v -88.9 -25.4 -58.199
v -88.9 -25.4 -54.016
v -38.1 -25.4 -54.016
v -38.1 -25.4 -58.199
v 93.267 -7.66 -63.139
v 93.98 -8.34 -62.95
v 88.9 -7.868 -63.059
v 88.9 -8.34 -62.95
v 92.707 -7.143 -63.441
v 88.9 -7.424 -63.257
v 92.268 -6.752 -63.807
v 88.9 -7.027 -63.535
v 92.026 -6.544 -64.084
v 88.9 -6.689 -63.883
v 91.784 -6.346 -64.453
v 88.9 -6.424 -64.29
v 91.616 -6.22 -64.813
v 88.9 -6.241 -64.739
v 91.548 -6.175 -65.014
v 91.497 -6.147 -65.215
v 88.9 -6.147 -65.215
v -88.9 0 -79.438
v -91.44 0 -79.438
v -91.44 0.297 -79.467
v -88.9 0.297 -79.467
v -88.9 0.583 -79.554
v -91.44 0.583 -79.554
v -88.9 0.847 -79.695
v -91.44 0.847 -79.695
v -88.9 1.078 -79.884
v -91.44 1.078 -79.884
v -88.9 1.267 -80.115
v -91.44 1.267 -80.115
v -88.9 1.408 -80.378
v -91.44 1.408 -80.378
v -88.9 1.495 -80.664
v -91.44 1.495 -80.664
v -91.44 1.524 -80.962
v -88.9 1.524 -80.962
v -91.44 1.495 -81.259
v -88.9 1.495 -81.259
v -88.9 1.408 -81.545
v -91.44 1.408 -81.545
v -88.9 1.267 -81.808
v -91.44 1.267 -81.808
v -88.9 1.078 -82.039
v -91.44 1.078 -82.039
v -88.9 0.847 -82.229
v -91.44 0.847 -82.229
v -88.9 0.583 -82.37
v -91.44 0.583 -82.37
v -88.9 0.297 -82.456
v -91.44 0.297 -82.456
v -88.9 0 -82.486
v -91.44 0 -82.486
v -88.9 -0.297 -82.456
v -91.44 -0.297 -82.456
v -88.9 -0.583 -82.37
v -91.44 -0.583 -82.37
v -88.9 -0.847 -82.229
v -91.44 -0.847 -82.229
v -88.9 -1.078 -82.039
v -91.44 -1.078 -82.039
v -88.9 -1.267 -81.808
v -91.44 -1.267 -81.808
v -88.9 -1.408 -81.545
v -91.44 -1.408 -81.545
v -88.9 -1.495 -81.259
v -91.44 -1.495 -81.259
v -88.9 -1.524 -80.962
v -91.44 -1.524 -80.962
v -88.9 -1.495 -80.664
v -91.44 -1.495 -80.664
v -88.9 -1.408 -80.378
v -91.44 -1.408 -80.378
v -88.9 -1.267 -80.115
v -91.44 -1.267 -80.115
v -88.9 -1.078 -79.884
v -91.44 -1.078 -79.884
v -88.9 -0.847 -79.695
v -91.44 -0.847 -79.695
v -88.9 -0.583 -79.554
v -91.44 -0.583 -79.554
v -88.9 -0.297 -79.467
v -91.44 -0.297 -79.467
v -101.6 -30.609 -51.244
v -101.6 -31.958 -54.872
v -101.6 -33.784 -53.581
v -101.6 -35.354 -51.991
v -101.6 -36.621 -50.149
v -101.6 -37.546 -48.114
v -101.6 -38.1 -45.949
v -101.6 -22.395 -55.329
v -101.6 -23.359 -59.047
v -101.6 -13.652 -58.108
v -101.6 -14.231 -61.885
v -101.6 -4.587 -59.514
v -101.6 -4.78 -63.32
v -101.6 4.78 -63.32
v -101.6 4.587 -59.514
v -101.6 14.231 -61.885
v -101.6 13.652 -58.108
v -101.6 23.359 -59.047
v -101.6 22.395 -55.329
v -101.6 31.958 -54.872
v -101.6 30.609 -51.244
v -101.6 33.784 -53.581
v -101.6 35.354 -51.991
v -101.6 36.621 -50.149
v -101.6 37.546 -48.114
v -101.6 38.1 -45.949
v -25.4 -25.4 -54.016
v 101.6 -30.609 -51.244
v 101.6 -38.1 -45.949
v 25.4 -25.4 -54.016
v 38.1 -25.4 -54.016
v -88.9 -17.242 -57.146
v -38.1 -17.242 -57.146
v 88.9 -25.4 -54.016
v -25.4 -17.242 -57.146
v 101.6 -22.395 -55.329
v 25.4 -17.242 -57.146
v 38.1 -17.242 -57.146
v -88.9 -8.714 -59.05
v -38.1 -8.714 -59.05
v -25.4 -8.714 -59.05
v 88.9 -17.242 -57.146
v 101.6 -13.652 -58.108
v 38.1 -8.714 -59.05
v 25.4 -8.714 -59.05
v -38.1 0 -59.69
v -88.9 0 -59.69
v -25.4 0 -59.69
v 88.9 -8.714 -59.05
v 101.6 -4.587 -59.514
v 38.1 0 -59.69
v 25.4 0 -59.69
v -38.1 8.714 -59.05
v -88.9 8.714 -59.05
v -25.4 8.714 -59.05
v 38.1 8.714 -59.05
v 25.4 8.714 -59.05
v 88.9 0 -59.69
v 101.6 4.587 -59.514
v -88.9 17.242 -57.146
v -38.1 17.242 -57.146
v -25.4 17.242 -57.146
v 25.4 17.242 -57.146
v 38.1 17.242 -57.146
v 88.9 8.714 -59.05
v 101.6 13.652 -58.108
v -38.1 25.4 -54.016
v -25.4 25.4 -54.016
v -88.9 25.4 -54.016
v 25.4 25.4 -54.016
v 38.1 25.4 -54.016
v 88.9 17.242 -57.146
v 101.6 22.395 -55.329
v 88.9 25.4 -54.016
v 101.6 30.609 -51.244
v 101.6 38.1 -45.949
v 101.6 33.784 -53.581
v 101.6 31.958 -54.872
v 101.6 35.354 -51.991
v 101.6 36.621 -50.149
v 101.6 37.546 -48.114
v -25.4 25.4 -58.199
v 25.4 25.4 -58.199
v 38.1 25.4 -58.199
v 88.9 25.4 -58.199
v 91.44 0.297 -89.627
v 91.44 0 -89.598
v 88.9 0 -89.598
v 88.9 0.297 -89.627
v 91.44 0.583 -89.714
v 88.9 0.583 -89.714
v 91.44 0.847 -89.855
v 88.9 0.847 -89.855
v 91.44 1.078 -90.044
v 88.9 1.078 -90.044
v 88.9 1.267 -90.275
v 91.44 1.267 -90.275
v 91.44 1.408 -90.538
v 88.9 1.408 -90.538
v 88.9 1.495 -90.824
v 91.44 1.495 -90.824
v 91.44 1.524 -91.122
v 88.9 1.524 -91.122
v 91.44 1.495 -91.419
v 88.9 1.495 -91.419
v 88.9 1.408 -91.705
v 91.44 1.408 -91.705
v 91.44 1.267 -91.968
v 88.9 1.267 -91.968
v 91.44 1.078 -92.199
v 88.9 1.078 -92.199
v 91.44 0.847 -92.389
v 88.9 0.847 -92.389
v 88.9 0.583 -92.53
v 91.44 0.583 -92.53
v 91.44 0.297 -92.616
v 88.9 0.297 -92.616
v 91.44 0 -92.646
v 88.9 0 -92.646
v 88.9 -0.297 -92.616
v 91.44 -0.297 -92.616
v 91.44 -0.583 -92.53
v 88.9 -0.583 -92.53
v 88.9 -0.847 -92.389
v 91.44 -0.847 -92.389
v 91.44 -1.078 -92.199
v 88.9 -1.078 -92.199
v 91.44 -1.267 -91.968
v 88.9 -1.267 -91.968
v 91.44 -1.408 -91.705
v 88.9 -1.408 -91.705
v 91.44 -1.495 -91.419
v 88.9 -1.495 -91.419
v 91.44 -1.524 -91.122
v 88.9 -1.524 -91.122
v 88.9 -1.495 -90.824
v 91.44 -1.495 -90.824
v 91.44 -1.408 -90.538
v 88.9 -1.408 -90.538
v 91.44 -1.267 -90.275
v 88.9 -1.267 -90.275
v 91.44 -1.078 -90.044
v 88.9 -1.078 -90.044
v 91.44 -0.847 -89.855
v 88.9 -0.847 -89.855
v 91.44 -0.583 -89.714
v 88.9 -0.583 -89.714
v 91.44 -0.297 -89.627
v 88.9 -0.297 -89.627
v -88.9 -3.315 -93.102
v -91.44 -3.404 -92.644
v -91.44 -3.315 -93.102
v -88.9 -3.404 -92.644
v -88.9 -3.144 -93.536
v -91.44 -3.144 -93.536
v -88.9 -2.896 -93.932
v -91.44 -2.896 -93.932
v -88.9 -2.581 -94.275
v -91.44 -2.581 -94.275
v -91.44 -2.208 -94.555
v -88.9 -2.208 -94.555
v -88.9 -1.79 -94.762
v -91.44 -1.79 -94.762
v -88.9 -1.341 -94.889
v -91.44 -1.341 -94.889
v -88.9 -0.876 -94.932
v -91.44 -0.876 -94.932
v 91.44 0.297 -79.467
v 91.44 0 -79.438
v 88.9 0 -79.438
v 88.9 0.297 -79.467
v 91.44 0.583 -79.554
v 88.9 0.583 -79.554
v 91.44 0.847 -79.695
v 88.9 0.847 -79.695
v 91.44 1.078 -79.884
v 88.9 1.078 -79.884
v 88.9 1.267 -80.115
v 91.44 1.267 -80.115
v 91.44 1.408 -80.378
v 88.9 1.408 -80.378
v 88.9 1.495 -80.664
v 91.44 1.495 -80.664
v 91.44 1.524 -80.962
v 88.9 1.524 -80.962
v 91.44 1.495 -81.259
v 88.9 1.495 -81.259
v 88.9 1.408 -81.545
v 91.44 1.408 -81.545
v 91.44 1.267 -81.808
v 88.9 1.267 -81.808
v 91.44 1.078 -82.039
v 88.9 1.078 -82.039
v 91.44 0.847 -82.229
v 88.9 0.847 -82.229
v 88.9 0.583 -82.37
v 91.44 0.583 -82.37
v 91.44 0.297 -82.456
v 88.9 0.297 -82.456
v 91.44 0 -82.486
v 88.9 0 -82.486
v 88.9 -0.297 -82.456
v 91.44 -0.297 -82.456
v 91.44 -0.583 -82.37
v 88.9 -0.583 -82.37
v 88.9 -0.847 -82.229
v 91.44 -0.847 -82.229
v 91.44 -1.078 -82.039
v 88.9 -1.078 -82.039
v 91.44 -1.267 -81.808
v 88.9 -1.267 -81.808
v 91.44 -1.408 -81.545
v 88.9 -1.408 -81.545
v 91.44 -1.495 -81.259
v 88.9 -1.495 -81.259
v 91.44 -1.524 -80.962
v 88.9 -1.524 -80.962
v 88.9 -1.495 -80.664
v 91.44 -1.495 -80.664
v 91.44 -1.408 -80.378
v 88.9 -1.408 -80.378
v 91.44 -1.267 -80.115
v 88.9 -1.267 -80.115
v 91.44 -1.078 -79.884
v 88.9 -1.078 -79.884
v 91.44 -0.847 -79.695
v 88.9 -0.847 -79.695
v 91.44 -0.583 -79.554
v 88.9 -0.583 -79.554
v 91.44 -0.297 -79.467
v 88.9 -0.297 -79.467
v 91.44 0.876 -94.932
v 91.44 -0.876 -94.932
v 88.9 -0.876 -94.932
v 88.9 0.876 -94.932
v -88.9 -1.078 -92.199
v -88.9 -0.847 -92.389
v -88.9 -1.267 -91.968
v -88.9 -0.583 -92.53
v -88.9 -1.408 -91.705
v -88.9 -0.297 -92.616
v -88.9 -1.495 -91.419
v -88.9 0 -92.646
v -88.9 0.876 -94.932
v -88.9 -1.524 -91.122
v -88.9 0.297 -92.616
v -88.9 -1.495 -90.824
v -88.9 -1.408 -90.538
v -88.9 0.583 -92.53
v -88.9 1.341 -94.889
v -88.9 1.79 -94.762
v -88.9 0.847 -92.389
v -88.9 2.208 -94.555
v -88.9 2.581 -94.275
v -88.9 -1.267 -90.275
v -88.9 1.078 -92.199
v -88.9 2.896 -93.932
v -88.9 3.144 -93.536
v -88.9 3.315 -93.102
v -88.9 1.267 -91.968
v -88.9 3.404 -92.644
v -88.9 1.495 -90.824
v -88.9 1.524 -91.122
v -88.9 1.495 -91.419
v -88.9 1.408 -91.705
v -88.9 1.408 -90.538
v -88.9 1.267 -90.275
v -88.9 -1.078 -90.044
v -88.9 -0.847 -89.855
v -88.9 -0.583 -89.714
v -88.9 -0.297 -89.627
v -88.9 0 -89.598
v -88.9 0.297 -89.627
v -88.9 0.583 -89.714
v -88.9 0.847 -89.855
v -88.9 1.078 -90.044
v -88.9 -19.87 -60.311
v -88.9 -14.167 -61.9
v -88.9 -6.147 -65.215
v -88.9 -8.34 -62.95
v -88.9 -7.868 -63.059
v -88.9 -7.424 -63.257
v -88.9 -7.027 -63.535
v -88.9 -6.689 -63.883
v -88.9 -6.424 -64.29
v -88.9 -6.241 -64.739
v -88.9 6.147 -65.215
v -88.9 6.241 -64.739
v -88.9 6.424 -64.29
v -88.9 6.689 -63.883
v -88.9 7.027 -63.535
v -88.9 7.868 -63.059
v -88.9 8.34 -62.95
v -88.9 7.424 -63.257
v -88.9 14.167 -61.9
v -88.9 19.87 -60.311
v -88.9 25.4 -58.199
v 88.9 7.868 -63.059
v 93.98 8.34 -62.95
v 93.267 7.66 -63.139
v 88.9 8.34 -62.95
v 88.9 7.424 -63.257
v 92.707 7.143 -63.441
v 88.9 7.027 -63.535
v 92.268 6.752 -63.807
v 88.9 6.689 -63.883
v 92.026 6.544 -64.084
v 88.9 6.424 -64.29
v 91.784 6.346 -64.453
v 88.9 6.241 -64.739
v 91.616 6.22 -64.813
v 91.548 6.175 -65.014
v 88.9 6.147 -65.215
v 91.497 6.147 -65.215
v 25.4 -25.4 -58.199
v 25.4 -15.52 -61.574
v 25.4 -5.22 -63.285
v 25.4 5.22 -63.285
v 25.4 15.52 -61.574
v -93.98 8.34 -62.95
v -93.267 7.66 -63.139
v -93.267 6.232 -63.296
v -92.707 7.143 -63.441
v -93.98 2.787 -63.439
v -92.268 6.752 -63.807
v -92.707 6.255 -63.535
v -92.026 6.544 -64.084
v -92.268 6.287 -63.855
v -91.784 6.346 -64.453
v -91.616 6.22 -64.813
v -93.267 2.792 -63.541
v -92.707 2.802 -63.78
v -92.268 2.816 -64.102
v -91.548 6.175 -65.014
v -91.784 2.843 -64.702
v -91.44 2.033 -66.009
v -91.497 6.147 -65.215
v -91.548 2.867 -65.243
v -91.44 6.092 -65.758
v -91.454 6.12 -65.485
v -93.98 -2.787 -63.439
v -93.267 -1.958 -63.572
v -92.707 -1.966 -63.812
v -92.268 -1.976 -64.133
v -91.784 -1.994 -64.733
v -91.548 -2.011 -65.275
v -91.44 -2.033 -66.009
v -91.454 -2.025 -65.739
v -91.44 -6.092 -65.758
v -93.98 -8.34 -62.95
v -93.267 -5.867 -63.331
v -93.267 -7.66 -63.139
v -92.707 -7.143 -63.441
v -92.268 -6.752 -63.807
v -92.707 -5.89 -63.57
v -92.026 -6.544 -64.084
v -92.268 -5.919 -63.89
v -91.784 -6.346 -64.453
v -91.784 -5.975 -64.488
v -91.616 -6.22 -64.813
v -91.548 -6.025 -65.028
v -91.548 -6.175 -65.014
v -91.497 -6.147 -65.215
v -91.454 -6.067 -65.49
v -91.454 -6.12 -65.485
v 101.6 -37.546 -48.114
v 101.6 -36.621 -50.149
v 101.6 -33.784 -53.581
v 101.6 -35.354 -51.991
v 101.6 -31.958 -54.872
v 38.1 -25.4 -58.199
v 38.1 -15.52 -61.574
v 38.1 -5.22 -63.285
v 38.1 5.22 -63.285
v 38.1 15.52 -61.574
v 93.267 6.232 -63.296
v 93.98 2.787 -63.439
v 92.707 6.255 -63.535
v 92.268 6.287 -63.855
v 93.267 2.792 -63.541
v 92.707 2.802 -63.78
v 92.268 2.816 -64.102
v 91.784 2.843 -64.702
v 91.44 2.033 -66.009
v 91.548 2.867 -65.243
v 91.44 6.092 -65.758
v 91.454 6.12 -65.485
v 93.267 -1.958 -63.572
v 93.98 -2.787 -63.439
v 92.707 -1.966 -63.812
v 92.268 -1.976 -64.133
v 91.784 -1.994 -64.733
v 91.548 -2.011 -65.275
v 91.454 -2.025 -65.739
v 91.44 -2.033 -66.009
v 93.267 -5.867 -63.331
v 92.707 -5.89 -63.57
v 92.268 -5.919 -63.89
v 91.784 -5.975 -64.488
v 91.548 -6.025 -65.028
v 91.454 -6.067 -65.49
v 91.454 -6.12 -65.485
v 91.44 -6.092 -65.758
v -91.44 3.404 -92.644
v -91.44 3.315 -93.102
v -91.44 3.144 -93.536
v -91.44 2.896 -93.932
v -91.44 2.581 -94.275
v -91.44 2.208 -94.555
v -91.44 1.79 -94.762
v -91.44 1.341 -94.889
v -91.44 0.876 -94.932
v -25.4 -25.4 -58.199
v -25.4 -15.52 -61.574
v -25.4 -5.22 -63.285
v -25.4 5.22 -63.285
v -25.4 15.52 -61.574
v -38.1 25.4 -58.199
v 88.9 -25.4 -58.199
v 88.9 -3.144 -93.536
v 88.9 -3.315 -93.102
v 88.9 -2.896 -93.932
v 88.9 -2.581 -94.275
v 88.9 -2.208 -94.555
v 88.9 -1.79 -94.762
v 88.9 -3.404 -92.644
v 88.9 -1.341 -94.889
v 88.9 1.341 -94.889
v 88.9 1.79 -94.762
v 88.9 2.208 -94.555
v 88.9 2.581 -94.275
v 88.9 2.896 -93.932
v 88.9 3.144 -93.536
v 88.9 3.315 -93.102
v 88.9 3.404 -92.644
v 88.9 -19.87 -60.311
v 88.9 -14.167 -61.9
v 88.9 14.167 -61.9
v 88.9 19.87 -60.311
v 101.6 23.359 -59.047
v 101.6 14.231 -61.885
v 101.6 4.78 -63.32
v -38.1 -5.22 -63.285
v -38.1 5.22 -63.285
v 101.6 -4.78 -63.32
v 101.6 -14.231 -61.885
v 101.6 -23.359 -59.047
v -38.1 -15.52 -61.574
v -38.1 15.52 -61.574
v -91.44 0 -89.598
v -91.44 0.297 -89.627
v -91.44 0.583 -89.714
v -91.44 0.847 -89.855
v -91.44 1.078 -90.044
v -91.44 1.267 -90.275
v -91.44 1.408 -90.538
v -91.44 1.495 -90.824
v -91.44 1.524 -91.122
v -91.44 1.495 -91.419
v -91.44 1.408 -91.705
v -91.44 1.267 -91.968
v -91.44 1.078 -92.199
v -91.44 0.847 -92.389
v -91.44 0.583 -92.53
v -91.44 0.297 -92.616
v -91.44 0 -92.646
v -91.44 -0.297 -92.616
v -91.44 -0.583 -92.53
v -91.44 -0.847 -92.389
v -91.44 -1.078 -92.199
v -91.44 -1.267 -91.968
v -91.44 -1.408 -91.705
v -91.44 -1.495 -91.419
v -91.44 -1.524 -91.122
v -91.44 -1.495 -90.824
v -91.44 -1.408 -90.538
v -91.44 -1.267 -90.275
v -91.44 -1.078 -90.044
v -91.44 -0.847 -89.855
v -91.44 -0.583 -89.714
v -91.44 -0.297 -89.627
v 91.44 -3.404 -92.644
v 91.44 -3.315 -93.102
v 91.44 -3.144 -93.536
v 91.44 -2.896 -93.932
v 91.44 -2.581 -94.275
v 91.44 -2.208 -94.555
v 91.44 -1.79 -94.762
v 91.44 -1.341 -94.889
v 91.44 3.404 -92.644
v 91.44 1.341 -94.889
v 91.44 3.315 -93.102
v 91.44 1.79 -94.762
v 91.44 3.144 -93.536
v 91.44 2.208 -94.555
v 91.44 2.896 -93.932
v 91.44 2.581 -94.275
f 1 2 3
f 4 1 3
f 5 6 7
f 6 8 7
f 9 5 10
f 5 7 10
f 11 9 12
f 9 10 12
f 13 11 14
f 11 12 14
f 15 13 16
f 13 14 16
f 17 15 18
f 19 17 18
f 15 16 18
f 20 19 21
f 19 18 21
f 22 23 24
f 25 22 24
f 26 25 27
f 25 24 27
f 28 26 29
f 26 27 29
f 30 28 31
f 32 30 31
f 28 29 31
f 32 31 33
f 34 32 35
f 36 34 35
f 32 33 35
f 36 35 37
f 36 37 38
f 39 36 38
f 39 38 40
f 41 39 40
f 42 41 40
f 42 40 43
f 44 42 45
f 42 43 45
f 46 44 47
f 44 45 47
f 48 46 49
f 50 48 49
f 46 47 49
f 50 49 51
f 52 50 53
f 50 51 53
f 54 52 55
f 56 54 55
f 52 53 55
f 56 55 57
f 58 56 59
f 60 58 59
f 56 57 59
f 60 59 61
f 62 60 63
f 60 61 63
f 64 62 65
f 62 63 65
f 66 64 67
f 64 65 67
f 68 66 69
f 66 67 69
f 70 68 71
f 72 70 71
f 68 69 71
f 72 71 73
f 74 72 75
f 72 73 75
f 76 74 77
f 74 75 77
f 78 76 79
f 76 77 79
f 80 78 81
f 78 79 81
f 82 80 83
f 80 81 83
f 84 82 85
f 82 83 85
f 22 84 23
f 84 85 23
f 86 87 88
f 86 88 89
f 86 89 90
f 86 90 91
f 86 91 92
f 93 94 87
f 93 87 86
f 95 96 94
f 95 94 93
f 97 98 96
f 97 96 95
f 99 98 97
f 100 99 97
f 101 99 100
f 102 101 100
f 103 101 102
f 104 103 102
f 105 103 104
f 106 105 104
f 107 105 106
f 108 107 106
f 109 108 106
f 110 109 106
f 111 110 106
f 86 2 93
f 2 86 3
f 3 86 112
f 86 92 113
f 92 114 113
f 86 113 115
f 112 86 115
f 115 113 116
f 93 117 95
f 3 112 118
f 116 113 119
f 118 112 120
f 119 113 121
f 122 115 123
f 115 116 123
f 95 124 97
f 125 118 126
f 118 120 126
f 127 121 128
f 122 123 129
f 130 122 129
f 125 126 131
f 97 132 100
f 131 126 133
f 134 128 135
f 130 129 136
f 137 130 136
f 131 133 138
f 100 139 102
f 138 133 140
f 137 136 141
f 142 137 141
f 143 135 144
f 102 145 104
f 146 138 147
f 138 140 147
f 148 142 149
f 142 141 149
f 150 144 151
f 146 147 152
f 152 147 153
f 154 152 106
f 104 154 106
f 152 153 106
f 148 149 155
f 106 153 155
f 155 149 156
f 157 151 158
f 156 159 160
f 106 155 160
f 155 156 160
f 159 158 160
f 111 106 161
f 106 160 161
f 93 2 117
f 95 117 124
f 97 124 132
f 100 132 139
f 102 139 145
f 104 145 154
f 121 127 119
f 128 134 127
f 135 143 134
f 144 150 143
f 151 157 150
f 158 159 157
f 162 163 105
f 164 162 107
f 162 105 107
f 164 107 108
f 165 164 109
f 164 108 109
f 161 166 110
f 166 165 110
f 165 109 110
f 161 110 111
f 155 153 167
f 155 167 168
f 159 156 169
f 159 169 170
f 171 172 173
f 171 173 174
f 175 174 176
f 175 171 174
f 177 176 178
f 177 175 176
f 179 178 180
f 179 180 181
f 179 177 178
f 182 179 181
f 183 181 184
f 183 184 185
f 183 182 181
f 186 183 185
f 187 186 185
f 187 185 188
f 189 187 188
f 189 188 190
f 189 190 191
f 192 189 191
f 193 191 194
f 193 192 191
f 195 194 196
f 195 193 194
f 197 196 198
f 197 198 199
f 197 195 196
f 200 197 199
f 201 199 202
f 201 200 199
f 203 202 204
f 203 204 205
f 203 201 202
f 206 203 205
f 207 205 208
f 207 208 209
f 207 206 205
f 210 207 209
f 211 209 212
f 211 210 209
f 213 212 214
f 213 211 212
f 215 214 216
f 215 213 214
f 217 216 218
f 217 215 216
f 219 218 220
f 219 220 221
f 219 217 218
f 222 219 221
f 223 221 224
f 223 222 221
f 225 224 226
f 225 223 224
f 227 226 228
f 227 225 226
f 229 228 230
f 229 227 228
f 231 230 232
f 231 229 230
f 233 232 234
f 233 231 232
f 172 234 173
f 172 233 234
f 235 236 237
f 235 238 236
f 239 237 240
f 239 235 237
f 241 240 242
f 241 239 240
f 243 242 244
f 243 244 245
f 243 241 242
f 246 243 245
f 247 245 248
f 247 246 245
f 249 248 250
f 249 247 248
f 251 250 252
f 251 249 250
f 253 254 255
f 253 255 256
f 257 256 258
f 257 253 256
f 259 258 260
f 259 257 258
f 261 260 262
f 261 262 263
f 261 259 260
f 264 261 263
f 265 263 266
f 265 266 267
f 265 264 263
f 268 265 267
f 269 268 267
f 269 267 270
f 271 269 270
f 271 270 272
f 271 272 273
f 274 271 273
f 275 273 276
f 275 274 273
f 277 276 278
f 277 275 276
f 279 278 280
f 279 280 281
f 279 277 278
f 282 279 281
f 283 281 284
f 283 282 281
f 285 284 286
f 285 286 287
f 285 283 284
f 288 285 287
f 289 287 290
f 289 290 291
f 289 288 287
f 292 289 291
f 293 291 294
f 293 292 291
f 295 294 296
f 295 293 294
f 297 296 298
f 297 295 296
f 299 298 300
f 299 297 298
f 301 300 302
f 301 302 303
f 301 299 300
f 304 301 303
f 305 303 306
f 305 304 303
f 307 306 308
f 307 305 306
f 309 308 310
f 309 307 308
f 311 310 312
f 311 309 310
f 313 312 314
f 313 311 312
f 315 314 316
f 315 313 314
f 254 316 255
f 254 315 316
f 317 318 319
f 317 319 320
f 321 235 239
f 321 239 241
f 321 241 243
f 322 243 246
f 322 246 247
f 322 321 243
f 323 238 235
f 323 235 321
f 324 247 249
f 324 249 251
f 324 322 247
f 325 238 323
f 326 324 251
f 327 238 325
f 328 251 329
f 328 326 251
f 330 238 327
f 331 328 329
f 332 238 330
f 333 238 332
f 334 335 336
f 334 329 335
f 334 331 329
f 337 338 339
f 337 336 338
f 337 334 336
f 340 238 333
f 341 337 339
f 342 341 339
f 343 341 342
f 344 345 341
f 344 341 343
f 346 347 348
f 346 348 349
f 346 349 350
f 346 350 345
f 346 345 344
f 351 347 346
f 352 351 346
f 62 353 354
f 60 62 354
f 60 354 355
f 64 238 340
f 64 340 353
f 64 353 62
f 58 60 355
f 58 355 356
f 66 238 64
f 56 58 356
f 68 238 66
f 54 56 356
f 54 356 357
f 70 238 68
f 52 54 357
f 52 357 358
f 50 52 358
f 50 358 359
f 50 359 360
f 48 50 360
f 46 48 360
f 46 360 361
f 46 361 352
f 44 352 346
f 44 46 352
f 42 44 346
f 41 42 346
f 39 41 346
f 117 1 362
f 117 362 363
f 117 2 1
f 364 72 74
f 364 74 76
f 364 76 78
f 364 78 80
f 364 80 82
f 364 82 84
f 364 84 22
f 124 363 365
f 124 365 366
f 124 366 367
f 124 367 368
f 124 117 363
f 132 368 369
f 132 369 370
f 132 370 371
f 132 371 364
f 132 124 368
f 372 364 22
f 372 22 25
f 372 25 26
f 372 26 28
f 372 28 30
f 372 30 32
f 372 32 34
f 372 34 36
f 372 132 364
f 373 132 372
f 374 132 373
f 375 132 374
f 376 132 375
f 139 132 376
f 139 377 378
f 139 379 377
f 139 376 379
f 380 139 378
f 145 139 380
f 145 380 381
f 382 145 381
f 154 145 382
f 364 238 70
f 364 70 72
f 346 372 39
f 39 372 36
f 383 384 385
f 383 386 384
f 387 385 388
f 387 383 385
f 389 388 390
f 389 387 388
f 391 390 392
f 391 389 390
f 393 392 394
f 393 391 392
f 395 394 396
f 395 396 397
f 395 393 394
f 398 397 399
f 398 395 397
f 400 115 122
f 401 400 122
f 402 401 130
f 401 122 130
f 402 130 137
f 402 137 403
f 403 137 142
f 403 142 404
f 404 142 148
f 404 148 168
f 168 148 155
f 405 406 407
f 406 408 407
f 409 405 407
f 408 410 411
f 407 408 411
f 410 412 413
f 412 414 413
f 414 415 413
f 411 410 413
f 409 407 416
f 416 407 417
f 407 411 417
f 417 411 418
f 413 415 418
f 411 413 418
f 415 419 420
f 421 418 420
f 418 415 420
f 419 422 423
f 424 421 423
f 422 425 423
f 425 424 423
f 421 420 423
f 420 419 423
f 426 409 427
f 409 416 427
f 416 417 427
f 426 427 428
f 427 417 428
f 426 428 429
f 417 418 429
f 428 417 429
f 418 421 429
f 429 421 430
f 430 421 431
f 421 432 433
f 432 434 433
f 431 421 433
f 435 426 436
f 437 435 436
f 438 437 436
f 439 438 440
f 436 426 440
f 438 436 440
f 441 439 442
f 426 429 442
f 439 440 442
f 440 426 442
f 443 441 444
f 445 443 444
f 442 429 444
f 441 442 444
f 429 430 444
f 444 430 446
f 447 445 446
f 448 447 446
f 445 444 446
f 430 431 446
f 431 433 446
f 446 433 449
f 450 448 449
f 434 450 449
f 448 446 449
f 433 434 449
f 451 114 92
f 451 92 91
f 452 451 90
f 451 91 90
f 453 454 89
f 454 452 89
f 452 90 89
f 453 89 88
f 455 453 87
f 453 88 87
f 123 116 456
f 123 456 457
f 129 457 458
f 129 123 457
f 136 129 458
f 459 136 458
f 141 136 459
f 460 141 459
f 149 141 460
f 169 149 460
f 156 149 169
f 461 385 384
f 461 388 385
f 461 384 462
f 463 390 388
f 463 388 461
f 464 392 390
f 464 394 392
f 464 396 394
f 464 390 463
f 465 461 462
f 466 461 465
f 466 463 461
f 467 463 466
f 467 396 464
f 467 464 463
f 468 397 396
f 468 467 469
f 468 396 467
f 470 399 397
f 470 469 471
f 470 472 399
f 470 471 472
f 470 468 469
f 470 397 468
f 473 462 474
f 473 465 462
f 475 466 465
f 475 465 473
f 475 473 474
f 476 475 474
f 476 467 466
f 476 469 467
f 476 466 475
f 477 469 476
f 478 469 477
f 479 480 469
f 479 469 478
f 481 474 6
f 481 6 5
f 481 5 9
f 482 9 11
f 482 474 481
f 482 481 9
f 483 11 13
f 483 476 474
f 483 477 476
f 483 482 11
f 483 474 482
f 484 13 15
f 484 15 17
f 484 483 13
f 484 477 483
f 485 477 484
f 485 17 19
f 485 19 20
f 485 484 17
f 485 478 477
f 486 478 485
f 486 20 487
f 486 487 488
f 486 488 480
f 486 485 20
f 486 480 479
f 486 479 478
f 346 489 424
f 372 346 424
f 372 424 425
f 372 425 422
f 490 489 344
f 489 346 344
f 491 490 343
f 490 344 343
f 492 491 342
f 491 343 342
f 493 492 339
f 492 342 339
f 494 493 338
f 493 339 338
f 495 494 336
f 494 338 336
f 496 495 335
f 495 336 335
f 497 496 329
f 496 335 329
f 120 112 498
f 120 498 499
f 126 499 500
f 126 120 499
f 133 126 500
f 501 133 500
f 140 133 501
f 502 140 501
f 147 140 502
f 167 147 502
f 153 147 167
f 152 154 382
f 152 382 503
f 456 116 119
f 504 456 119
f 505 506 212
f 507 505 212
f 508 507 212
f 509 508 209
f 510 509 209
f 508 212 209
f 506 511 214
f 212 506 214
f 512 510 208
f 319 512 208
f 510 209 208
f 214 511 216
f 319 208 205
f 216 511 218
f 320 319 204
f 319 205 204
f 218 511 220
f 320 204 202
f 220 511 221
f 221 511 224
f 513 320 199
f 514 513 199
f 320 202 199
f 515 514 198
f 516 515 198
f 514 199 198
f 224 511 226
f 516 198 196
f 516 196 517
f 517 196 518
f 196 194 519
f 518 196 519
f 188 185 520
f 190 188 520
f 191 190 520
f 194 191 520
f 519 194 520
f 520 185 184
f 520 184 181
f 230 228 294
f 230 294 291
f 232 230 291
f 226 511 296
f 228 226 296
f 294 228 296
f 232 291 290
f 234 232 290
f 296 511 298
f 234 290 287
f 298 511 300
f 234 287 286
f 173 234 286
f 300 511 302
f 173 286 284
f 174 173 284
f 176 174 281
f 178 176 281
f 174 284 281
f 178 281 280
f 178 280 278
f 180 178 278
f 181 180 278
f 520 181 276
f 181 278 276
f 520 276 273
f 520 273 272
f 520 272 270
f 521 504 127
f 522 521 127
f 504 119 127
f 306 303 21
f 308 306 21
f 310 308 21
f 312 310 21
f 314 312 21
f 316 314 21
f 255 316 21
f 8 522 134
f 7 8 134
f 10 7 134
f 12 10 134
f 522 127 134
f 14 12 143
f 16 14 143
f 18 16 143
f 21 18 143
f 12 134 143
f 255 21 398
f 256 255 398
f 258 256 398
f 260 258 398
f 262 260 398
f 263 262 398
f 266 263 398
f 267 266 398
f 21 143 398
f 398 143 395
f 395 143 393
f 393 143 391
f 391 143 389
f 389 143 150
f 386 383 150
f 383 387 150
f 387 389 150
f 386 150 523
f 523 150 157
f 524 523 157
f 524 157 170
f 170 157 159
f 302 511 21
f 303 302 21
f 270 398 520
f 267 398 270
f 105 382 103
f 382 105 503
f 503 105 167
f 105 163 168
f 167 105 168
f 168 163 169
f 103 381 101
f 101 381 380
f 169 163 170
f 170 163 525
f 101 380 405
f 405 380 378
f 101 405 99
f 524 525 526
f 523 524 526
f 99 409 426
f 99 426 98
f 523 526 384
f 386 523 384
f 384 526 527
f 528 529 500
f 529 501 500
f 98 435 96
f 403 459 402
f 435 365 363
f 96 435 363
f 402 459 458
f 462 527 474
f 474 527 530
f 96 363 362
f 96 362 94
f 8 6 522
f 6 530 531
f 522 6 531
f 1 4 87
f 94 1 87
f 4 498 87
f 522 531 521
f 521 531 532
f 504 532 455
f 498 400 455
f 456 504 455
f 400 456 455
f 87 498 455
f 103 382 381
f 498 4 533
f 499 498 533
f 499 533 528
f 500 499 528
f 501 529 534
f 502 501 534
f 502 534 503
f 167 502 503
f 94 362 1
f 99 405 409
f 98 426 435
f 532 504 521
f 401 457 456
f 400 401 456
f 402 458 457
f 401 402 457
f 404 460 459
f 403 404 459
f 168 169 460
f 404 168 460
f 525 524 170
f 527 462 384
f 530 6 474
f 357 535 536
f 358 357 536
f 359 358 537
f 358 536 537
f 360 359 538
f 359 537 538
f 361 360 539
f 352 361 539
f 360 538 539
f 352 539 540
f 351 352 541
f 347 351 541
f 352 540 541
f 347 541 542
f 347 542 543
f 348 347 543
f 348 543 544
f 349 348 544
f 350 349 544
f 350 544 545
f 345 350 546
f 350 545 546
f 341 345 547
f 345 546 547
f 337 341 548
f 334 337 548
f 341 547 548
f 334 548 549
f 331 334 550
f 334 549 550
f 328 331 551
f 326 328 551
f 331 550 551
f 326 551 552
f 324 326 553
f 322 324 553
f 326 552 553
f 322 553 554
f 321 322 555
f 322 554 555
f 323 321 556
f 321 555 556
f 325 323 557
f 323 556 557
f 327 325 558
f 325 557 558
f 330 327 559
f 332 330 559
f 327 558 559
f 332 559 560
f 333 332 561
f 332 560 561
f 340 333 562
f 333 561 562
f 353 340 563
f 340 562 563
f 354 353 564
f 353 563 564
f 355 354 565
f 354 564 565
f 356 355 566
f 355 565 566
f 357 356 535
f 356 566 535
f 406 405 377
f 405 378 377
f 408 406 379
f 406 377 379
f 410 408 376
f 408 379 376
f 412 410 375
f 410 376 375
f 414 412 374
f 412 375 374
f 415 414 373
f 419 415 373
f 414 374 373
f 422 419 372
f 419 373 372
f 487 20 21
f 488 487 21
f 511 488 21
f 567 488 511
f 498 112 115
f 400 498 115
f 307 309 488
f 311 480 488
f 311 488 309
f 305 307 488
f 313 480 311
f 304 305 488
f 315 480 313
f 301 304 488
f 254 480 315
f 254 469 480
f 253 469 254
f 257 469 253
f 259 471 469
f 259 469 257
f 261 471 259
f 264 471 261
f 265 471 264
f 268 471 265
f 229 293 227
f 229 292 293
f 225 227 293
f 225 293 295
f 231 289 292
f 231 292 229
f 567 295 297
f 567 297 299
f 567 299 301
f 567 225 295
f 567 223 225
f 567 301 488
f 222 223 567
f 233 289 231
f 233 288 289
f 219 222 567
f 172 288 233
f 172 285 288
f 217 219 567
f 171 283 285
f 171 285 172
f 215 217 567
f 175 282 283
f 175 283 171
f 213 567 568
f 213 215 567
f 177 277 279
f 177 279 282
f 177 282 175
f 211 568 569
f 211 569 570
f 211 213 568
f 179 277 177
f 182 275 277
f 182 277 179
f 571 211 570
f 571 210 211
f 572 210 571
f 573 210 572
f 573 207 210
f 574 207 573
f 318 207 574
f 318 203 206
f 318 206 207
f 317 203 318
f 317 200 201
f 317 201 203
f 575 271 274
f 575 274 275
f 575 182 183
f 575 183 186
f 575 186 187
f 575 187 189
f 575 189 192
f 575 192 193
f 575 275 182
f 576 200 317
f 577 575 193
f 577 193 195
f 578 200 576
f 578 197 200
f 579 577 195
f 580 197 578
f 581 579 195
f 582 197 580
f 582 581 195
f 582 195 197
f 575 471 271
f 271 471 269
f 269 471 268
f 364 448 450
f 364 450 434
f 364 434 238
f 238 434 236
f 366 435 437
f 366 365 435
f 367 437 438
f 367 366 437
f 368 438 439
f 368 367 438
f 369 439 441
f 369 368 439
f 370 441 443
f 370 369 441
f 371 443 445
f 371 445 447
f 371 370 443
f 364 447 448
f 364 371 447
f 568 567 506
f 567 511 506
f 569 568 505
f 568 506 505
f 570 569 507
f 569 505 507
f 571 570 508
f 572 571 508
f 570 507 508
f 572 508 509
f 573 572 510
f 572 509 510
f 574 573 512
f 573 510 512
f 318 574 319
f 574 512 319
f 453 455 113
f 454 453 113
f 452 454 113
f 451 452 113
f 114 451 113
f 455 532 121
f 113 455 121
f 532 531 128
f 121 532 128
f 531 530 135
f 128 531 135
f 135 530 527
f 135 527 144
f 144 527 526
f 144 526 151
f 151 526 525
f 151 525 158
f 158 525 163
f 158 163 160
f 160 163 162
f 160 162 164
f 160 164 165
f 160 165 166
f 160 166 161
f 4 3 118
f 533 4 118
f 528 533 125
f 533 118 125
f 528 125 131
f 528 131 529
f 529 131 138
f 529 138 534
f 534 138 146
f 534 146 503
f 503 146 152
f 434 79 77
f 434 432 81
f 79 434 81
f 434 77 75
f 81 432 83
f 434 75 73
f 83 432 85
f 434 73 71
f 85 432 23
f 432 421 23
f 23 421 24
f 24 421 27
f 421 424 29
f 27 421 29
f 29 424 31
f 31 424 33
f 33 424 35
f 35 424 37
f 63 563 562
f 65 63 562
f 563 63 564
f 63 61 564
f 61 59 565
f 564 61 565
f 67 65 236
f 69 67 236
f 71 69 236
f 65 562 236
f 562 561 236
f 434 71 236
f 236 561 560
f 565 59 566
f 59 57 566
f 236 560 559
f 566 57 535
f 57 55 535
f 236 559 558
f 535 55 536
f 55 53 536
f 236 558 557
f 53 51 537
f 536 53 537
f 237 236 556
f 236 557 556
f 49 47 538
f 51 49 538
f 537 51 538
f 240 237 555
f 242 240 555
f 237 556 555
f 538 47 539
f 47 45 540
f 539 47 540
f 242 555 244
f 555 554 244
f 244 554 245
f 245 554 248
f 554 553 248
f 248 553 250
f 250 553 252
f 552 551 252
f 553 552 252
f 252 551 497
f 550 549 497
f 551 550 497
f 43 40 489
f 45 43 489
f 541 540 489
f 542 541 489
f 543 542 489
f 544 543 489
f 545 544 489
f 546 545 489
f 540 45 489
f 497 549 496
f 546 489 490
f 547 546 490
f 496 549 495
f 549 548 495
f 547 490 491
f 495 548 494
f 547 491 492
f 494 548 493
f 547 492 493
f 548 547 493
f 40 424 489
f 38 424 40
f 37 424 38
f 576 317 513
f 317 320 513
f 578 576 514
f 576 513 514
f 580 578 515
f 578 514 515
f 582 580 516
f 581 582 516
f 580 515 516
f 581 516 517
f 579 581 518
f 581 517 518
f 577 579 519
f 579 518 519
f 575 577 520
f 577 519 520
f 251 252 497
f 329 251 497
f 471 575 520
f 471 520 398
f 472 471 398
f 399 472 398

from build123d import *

# Parameters (mm, degrees)
BOSS_EXTRUDE1_DEPTH = 101.6
SKETCH2_W           = 50.8
SKETCH2_H           = 50.8
CUT_EXTRUDE1_DEPTH  = 126.723585695
FILLET1_R           = 12.7
BOSS_EXTRUDE4_START = -2.54
SKETCH6_R           = 1.524
BOSS_EXTRUDE4_DEPTH = 2.54
FILLET4_R           = 2.54


with BuildPart() as part:
    # Sketch1 → Boss-Extrude1 (new, symmetric)
    with BuildSketch(Plane(origin=(0, 0, 0), x_dir=(0, 0, -1), z_dir=(1, 0, 0))):
        with BuildLine():
            Line((50.8, -38.1), (45.948733388, -38.1))
            ThreePointArc((45.948733388, -38.1), (59.69, 0), (45.948733388, 38.1))
            Line((45.948733388, 38.1), (50.8, 38.1))
            ThreePointArc((50.8, 38.1), (63.5, 0), (50.8, -38.1))
        make_face()
    extrude(amount=BOSS_EXTRUDE1_DEPTH, both=True)

    # Sketch2 → Cut-Extrude1 (cut, through all)
    with BuildSketch(Plane.XY):
        with Locations((-63.5, 0)):
            Rectangle(SKETCH2_W, SKETCH2_H)
        with Locations((63.5, 0)):
            Rectangle(SKETCH2_W, SKETCH2_H)
        Rectangle(SKETCH2_W, SKETCH2_H)
    extrude(amount=-CUT_EXTRUDE1_DEPTH, mode=Mode.SUBTRACT)

    # Fillet1
    # the kernel refuses this fillet: 12.7 mm, written as the material it takes off along each edge
    with BuildSketch(Plane(origin=(-120.021720302, 38.1, -50.8), x_dir=(0, -0.8334649822738217, -0.5525722788226877), z_dir=(1, 0, 0))) as fillet1_piece_1:
        with BuildLine():
            CenterArc((6.631819309, -12.678604985), FILLET1_R, 86.673763994, 50.487243594)
            Line((-2.680675447, -4.04336084), (-2.866925342, -3.870655958))
            ThreePointArc((-2.866925342, -3.870655958), (-1.552037829, -1.881327061), (-0.211700105, 0.140353359))
            Line((-0.211700105, 0.140353359), (-0.014737376, 0.2535721))
            ThreePointArc((-0.014737376, 0.2535721), (3.68434406, 0.360975077), (7.383425497, 0.2535721))
            Line((7.383425497, 0.2535721), (7.368688121, 0))
        make_face()
    extrude(amount=240.043440604, mode=Mode.SUBTRACT)
    with BuildSketch(Plane(origin=(-120.021720302, -38.1, -50.8), x_dir=(0, 0, 1), z_dir=(1, 0, 0))) as fillet1_piece_2:
        with BuildLine():
            CenterArc((6.90261377, -12.533234811), FILLET1_R, 99.295330772, 50.487243594)
            Line((-4.071732787, -6.141543514), (-4.291219718, -6.013709688))
            ThreePointArc((-4.291219718, -6.013709688), (-2.33672648, -2.871306936), (-0.2032, 0.1524))
            Line((-0.2032, 0.1524), (0, 0.254))
            ThreePointArc((0, 0.254), (2.425633306, 0.254), (4.810239668, 0.250664696))
            Line((4.810239668, 0.250664696), (4.851266612, 0))
        make_face()
    extrude(amount=240.043440604, mode=Mode.SUBTRACT)

    # Sketch6 → Boss-Extrude4 (add)
    with BuildSketch(Plane.ZY.offset(-88.9).offset(BOSS_EXTRUDE4_START)):
        with BuildLine():
            Line((-63.181702256, -6.35), (-94.931702256, -3.175))
            Line((-94.931702256, -3.175), (-94.931702256, 3.175))
            Line((-94.931702256, 3.175), (-63.181702256, 6.35))
            ThreePointArc((-63.181702256, 6.35), (-63.5, 0), (-63.181702256, -6.35))
        make_face()
        with Locations((-91.121702256, 0)):
            Circle(SKETCH6_R, mode=Mode.SUBTRACT)
        with Locations((-80.961702256, 0)):
            Circle(SKETCH6_R, mode=Mode.SUBTRACT)
    boss_extrude4 = extrude(amount=BOSS_EXTRUDE4_DEPTH)

    # Mirror2: Boss-Extrude4 across plane
    add(boss_extrude4.mirror(Plane(origin=(0, 0, 0), x_dir=(0, 0, 1), z_dir=(1, 0, 0))))

    # Fillet4
    fillet4_edges = [part.edges().sort_by_distance(p)[0] for p in [
        (90.17, 6.35, -63.181702256),
        (90.17, -6.35, -63.181702256),
        (90.17, -3.175, -94.931702256),
        (90.17, 3.175, -94.931702256),
        (-91.44, 0, -63.5),
        (-90.17, -6.35, -63.181702256),
        (-90.17, 6.35, -63.181702256),
        (-90.17, 3.175, -94.931702256),
        (-90.17, -3.175, -94.931702256),
        (91.44, 0, -63.5),
    ]]
    fillet(fillet4_edges, radius=FILLET4_R)


solid = part.part
